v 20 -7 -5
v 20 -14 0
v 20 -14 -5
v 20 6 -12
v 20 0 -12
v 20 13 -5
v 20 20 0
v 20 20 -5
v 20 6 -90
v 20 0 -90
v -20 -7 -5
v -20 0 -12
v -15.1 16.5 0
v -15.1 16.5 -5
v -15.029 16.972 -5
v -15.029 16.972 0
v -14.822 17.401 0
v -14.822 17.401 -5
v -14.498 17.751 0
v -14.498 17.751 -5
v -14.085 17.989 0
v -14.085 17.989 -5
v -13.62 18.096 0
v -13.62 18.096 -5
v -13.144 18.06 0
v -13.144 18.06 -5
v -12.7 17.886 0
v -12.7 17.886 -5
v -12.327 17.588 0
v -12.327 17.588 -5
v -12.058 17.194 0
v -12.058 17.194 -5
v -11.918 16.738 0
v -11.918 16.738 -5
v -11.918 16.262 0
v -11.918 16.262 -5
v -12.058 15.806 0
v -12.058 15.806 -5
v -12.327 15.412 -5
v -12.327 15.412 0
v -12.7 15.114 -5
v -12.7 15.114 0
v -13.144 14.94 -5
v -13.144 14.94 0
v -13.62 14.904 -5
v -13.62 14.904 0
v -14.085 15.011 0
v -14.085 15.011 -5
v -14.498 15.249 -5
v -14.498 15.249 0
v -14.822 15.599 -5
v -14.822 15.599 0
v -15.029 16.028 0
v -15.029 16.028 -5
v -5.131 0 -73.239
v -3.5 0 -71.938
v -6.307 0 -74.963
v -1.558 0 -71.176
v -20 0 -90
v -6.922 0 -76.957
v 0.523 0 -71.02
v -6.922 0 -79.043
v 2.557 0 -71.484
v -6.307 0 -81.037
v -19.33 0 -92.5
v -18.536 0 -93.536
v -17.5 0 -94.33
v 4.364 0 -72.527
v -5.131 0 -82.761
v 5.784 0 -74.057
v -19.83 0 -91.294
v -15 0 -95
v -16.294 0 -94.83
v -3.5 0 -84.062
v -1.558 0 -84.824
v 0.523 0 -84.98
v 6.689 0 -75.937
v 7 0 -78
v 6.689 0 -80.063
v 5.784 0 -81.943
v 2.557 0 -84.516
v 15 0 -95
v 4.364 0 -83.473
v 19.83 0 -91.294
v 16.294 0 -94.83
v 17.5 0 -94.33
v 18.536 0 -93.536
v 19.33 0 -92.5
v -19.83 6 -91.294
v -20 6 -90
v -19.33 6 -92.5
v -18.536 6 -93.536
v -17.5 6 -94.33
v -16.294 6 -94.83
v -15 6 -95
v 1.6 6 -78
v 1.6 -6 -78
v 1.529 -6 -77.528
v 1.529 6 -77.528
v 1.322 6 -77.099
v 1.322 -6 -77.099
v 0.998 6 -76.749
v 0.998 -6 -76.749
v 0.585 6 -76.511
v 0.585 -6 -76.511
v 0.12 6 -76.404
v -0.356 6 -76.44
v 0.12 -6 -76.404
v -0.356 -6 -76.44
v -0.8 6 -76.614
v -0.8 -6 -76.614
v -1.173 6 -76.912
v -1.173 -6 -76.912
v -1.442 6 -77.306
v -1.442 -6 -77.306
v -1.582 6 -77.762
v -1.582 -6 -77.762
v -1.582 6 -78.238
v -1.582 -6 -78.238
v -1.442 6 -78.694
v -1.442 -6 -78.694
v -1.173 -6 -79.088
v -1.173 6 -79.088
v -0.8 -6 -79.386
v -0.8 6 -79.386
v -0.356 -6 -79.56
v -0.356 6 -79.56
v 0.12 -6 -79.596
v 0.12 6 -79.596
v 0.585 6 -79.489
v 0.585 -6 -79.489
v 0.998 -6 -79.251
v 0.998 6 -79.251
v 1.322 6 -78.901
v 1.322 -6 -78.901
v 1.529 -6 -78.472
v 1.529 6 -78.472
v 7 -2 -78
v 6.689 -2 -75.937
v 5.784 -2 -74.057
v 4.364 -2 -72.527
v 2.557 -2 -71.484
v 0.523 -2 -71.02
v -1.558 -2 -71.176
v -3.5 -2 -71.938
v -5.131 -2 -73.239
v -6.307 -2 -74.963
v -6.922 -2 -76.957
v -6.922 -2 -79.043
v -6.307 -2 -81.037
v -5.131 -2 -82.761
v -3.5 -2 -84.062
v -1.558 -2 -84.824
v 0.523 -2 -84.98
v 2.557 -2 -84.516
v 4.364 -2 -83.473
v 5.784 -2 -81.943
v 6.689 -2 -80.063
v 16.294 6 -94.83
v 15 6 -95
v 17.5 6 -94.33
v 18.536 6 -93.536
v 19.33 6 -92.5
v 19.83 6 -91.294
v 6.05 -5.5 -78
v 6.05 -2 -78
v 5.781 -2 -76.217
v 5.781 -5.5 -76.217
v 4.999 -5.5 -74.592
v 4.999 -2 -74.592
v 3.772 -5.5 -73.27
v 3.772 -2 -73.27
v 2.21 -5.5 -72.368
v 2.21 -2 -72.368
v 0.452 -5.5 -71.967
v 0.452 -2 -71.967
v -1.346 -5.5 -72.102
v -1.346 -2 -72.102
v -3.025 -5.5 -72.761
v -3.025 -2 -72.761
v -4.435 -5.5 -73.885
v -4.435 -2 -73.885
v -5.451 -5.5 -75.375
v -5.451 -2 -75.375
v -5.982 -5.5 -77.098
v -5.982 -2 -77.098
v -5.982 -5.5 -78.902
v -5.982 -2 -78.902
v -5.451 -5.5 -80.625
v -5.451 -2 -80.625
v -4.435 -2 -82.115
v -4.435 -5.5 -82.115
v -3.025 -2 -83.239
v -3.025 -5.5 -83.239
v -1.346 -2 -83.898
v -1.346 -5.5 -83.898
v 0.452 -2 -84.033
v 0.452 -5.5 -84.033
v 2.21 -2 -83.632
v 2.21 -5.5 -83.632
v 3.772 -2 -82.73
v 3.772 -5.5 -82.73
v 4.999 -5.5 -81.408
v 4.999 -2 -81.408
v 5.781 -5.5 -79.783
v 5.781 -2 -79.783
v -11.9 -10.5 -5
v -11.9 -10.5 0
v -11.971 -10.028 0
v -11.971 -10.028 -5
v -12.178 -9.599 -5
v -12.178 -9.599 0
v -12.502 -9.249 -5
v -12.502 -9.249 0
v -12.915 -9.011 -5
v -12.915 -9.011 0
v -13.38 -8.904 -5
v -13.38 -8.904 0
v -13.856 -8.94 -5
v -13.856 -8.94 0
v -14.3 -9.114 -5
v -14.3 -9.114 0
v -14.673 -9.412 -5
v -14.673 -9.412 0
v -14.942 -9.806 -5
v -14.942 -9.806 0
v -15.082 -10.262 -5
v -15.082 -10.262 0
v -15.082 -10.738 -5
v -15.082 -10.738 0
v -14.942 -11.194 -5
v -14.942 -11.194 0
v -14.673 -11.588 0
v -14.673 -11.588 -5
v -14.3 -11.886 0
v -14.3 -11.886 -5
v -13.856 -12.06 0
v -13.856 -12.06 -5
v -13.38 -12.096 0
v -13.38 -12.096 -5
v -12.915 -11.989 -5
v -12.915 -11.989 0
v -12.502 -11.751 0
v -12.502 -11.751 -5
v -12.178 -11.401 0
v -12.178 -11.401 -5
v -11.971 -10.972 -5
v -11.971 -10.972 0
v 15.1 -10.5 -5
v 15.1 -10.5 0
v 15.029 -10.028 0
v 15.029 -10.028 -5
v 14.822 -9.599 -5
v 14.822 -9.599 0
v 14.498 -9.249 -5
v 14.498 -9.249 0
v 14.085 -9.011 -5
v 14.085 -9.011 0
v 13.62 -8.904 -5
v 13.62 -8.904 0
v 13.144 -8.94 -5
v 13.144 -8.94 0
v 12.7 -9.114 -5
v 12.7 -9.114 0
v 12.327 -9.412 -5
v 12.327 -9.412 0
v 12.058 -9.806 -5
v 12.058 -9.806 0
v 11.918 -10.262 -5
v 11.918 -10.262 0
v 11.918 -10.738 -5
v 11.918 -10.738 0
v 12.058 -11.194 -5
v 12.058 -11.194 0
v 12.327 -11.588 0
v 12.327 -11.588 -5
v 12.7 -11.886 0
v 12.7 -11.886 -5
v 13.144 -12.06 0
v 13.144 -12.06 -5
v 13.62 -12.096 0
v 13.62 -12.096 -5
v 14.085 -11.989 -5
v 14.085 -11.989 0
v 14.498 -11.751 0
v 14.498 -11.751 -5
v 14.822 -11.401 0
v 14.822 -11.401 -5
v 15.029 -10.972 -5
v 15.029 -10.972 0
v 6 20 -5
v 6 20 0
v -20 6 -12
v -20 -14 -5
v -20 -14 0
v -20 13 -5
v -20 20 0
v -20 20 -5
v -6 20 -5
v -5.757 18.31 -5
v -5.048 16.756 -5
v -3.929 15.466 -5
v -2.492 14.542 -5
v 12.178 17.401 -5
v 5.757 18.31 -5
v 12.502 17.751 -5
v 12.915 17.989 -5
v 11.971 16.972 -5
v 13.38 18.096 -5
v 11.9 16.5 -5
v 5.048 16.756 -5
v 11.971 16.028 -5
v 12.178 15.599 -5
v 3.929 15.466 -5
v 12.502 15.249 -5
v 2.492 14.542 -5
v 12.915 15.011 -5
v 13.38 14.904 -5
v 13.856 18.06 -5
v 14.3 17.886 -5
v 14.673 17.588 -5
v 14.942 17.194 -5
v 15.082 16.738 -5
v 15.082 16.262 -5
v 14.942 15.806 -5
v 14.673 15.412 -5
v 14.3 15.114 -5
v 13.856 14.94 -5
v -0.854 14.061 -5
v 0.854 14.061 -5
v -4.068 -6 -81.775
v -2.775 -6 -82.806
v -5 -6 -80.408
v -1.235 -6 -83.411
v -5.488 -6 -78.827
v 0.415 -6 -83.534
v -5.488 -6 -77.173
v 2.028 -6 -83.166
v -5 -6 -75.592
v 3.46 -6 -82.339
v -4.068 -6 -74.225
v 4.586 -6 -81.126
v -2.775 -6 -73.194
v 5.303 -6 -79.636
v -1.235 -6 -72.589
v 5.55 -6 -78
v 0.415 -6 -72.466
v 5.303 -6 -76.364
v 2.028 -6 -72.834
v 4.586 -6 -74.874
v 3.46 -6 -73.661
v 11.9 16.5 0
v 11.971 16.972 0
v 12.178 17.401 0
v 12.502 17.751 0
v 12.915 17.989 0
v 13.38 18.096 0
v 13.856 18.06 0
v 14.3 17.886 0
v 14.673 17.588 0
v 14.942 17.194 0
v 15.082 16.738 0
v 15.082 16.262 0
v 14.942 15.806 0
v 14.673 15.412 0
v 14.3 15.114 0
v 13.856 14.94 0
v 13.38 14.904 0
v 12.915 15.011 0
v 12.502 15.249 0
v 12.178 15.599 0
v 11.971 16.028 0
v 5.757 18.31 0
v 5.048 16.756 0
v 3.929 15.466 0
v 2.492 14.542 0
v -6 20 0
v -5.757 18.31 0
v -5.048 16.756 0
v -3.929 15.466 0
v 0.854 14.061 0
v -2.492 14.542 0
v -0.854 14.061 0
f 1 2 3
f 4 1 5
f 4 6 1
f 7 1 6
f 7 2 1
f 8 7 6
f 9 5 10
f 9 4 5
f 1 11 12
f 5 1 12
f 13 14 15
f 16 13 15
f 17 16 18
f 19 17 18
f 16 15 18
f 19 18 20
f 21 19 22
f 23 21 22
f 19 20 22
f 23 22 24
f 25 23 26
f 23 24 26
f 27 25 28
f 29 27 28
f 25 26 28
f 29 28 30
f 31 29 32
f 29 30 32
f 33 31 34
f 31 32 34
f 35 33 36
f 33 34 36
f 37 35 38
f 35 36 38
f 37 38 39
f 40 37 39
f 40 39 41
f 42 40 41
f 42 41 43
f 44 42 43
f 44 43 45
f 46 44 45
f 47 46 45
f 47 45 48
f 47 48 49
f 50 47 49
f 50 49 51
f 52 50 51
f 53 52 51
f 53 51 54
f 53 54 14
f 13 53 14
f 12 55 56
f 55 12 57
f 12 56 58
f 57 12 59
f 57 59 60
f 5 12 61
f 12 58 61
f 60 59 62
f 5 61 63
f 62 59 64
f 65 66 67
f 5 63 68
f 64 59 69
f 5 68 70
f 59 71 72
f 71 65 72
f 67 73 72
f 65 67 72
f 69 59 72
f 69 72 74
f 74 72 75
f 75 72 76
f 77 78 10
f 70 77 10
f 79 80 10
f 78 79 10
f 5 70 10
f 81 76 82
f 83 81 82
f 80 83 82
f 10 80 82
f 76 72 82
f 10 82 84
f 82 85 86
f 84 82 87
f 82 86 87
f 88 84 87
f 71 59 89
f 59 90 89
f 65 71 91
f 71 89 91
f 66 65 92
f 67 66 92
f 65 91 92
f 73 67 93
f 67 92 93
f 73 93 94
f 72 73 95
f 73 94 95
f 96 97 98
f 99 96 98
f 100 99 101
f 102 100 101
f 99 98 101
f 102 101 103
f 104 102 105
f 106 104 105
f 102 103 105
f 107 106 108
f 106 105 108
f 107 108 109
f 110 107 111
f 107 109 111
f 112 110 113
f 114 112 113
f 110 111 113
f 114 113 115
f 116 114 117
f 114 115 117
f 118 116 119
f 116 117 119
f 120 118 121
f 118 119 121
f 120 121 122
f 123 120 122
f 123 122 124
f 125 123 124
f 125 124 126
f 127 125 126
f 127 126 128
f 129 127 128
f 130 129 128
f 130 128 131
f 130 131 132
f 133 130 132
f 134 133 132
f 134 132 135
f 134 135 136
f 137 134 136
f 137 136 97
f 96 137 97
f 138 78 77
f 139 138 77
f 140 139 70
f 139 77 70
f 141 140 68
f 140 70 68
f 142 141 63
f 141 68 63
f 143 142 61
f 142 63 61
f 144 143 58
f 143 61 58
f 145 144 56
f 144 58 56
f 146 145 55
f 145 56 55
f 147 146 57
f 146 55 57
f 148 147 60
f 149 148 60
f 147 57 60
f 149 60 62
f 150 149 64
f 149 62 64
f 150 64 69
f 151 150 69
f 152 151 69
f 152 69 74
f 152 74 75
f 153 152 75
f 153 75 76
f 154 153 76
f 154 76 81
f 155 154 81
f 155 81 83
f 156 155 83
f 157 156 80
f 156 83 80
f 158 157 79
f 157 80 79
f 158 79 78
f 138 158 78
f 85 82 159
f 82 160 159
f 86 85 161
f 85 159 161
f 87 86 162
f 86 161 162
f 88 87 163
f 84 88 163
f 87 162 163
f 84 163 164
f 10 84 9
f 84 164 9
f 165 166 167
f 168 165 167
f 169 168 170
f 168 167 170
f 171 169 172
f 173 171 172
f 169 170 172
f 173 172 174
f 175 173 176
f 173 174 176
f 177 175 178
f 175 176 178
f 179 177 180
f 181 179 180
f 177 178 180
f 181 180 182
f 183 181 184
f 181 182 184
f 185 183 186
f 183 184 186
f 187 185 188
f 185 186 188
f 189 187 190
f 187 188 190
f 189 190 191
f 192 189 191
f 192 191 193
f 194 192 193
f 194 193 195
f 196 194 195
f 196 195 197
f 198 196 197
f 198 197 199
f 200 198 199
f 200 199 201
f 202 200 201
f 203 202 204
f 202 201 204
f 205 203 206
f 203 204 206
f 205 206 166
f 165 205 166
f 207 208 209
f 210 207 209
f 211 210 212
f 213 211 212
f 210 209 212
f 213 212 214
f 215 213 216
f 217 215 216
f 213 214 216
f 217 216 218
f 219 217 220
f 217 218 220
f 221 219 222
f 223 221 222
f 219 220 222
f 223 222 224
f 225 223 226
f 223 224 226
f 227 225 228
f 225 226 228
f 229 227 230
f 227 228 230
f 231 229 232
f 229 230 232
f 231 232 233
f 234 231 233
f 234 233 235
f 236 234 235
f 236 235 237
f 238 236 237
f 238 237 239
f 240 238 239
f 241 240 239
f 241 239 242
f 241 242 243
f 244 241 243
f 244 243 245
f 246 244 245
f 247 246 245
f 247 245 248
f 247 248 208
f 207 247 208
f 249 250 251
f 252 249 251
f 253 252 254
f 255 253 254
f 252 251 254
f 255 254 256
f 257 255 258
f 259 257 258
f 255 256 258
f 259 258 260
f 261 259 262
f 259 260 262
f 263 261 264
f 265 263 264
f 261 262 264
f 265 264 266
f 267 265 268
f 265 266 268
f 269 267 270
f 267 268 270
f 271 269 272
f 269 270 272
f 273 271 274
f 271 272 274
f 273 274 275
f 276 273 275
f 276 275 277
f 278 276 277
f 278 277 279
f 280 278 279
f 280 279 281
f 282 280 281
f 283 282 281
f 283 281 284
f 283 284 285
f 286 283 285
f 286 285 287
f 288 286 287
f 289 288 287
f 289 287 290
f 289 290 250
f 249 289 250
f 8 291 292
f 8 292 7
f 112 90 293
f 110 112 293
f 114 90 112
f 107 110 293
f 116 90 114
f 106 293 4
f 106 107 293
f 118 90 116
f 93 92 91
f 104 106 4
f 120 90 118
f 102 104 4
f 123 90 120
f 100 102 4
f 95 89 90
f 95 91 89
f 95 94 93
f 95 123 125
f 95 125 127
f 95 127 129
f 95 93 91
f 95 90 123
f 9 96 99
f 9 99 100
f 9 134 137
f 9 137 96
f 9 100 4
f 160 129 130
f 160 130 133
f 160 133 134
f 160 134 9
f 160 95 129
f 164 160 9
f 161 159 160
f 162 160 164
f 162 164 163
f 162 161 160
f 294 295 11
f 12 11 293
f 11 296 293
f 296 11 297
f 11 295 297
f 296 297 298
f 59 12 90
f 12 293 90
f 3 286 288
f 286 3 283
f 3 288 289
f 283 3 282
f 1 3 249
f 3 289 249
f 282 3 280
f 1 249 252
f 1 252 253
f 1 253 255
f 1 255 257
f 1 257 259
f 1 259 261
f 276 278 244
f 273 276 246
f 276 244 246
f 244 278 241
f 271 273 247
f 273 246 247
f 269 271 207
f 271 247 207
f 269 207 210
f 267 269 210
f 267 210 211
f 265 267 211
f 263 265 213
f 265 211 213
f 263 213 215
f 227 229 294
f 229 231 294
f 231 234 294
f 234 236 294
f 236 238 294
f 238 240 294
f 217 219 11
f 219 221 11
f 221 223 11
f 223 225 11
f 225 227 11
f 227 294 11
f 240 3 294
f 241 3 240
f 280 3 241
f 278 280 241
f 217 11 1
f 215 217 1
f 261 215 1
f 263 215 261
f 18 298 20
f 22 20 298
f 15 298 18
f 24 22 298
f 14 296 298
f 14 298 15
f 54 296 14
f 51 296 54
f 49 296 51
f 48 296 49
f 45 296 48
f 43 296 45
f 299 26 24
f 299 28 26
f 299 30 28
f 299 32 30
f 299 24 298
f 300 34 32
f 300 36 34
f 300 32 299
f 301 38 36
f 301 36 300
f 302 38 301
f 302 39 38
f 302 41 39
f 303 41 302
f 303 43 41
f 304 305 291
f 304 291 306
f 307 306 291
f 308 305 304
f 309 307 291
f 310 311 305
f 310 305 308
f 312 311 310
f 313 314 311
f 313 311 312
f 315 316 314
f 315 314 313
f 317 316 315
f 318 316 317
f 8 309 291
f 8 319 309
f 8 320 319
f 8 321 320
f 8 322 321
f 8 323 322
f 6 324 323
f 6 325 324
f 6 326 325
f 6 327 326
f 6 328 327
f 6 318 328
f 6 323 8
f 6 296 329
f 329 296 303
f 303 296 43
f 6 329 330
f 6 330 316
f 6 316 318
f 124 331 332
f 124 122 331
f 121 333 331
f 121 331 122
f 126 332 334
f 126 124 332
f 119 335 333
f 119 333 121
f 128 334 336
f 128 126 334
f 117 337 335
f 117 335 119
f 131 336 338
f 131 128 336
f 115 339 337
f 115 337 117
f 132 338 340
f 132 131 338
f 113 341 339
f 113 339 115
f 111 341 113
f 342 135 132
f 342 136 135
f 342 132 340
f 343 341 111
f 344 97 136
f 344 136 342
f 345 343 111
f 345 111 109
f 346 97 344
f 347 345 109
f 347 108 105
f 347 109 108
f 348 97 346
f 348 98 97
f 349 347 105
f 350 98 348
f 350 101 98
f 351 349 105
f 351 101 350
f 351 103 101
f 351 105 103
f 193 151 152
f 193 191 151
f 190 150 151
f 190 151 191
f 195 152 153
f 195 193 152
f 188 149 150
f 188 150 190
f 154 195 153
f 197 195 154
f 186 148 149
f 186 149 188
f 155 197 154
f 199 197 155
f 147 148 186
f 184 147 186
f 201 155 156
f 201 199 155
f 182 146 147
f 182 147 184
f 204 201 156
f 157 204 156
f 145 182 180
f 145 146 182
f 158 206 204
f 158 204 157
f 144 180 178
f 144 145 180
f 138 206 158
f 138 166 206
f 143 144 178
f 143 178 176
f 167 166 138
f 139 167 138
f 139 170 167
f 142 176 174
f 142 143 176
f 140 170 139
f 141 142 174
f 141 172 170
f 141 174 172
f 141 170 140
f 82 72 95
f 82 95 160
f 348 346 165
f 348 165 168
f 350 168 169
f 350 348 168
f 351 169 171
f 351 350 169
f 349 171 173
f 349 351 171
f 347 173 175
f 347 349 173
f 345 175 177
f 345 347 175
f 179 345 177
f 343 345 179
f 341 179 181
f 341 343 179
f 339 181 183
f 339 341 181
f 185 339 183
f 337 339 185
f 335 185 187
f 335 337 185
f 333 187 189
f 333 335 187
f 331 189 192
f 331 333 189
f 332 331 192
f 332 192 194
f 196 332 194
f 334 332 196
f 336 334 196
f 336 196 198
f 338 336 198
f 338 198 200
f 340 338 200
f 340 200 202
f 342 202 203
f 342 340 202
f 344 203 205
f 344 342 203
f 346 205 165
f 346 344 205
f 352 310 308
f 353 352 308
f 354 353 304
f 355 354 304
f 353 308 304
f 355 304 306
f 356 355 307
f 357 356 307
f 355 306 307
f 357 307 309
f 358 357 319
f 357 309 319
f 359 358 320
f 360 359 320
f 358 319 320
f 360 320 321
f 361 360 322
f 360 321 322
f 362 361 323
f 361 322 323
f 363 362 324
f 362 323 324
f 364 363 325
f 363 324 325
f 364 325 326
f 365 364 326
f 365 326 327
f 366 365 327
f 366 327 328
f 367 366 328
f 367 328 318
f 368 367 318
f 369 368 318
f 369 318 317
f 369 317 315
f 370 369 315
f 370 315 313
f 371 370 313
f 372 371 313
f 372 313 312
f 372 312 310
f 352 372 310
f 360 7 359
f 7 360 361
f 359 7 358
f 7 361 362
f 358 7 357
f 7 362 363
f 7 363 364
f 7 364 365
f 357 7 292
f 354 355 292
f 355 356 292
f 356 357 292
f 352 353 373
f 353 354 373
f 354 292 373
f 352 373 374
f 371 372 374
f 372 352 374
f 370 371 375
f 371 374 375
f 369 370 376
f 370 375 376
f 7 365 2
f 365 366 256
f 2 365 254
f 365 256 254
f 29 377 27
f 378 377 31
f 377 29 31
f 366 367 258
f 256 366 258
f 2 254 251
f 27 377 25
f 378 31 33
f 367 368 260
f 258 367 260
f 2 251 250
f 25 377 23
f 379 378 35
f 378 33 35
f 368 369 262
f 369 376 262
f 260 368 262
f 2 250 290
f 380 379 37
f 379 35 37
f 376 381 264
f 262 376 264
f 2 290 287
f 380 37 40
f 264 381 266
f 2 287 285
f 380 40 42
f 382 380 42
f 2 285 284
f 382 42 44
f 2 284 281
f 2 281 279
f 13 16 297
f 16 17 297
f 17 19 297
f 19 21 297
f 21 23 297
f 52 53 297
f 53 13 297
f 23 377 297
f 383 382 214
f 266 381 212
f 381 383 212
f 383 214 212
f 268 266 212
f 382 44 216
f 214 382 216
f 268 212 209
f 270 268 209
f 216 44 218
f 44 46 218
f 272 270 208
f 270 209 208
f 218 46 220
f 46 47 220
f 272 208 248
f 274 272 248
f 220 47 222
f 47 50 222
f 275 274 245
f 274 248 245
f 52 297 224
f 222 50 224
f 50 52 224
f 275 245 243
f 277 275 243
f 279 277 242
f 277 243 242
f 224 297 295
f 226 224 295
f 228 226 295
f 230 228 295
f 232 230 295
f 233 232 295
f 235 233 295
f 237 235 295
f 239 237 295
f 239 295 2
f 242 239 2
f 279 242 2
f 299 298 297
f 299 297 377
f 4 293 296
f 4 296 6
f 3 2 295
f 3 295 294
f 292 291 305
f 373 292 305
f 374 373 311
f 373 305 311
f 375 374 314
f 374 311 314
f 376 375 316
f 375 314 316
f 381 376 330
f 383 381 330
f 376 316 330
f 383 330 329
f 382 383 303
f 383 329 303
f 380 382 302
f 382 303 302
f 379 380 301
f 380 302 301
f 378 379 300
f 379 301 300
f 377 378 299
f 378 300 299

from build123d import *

# Parameters (mm, degrees)
SKETCH_1_W          = 40
SKETCH_1_H          = 95
EXTRUDE_1_DEPTH     = 6
SKETCH_2_W          = 40
SKETCH_2_H          = 5
EXTRUDE_2_DEPTH     = 14
SKETCH_3_R          = 6
CUT_EXTRUDE_1_DEPTH = 14
SKETCH_4_R          = 1.6
CUT_EXTRUDE_2_DEPTH = 14
CHAMFER_1_SIZE      = 7
FILLET_1_R          = 5
EXTRUDE_3_DEPTH     = 40
SKETCH_8_R          = 1.6
CUT_EXTRUDE_3_DEPTH = 40
SKETCH_5_R          = 7
EXTRUDE_4_DEPTH     = 2
SKETCH_9_R          = 6.05
EXTRUDE_5_DEPTH     = 4
CHAMFER_2_SIZE      = 0.5
SKETCH_10_R         = 1.6
CUT_EXTRUDE_4_DEPTH = 27


with BuildPart() as part:
    # Эскиз1 → Бобышка-Вытянуть1 (new body)
    with BuildSketch(Plane(origin=(0, 0, 0), x_dir=(1, 0, 0), z_dir=(0, 1, 0))):
        with Locations((0, 47.5)):
            Rectangle(SKETCH_1_W, SKETCH_1_H)
    extrude(amount=EXTRUDE_1_DEPTH)

    # Эскиз2 → Бобышка-Вытянуть2 (add)
    with BuildSketch(Plane(origin=(0, 6, 0), x_dir=(1, 0, 0), z_dir=(0, 1, 0))):
        with Locations((0, 2.5)):
            Rectangle(SKETCH_2_W, SKETCH_2_H)
    extrude(amount=EXTRUDE_2_DEPTH)

    # Эскиз3 → Вырез-Вытянуть1 (cut)
    with BuildSketch(Plane(origin=(0, 0, -5), x_dir=(-1, 0, 0), z_dir=(0, 0, -1))):
        with Locations((0, 20)):
            Circle(SKETCH_3_R)
    extrude(amount=-CUT_EXTRUDE_1_DEPTH, mode=Mode.SUBTRACT)

    # Эскиз4 → Вырез-Вытянуть2 (cut)
    with BuildSketch(Plane(origin=(0, 0, -5), x_dir=(-1, 0, 0), z_dir=(0, 0, -1))):
        with Locations((-13.5, 16.5)):
            Circle(SKETCH_4_R)
        with Locations((13.5, 16.5)):
            Circle(SKETCH_4_R)
    extrude(amount=-CUT_EXTRUDE_2_DEPTH, mode=Mode.SUBTRACT)

    # Фаска1
    chamfer_1_edges = [part.edges().sort_by_distance(p)[0] for p in [
        (0, 6, -5),
    ]]
    chamfer(chamfer_1_edges, length=CHAMFER_1_SIZE)

    # Скругление1
    fillet_1_edges = [part.edges().sort_by_distance(p)[0] for p in [
        (-20, 3, -95),
        (20, 3, -95),
    ]]
    fillet(fillet_1_edges, radius=FILLET_1_R)

    # Эскиз7 → Бобышка-Вытянуть3 (add)
    with BuildSketch(Plane.ZY.offset(20)):
        Polygon((0, -14), (-5, -14), (-5, -7), (-12, 0), (0, 0), align=None)
    extrude(amount=-EXTRUDE_3_DEPTH)

    # Эскиз8 → Вырез-Вытянуть3 (cut)
    with BuildSketch(Plane.XY):
        with Locations((13.5, 16.5)):
            Circle(SKETCH_8_R)
        with Locations((-13.5, 16.5)):
            Circle(SKETCH_8_R)
        with Locations((13.5, -10.5)):
            Circle(SKETCH_8_R)
        with Locations((-13.5, -10.5)):
            Circle(SKETCH_8_R)
    extrude(amount=-CUT_EXTRUDE_3_DEPTH, mode=Mode.SUBTRACT)

    # Эскиз5 → Бобышка-Вытянуть4 (add)
    with BuildSketch(Plane.XZ):
        with Locations((0, -78)):
            Circle(SKETCH_5_R)
    extrude(amount=EXTRUDE_4_DEPTH)

    # Эскиз9 → Бобышка-Вытянуть5 (add)
    with BuildSketch(Plane.XZ.offset(2)):
        with Locations((0, -78)):
            Circle(SKETCH_9_R)
    extrude(amount=EXTRUDE_5_DEPTH)

    # Фаска2
    chamfer_2_edges = [part.edges().sort_by_distance(p)[0] for p in [
        (-6.05, -6, -78),
    ]]
    chamfer(chamfer_2_edges, length=CHAMFER_2_SIZE)

    # Эскиз10 → Вырез-Вытянуть4 (cut, through all)
    with BuildSketch(Plane.XZ.offset(6)):
        with Locations((0, -78)):
            Circle(SKETCH_10_R)
    extrude(amount=-CUT_EXTRUDE_4_DEPTH, mode=Mode.SUBTRACT)


solid = part.part
